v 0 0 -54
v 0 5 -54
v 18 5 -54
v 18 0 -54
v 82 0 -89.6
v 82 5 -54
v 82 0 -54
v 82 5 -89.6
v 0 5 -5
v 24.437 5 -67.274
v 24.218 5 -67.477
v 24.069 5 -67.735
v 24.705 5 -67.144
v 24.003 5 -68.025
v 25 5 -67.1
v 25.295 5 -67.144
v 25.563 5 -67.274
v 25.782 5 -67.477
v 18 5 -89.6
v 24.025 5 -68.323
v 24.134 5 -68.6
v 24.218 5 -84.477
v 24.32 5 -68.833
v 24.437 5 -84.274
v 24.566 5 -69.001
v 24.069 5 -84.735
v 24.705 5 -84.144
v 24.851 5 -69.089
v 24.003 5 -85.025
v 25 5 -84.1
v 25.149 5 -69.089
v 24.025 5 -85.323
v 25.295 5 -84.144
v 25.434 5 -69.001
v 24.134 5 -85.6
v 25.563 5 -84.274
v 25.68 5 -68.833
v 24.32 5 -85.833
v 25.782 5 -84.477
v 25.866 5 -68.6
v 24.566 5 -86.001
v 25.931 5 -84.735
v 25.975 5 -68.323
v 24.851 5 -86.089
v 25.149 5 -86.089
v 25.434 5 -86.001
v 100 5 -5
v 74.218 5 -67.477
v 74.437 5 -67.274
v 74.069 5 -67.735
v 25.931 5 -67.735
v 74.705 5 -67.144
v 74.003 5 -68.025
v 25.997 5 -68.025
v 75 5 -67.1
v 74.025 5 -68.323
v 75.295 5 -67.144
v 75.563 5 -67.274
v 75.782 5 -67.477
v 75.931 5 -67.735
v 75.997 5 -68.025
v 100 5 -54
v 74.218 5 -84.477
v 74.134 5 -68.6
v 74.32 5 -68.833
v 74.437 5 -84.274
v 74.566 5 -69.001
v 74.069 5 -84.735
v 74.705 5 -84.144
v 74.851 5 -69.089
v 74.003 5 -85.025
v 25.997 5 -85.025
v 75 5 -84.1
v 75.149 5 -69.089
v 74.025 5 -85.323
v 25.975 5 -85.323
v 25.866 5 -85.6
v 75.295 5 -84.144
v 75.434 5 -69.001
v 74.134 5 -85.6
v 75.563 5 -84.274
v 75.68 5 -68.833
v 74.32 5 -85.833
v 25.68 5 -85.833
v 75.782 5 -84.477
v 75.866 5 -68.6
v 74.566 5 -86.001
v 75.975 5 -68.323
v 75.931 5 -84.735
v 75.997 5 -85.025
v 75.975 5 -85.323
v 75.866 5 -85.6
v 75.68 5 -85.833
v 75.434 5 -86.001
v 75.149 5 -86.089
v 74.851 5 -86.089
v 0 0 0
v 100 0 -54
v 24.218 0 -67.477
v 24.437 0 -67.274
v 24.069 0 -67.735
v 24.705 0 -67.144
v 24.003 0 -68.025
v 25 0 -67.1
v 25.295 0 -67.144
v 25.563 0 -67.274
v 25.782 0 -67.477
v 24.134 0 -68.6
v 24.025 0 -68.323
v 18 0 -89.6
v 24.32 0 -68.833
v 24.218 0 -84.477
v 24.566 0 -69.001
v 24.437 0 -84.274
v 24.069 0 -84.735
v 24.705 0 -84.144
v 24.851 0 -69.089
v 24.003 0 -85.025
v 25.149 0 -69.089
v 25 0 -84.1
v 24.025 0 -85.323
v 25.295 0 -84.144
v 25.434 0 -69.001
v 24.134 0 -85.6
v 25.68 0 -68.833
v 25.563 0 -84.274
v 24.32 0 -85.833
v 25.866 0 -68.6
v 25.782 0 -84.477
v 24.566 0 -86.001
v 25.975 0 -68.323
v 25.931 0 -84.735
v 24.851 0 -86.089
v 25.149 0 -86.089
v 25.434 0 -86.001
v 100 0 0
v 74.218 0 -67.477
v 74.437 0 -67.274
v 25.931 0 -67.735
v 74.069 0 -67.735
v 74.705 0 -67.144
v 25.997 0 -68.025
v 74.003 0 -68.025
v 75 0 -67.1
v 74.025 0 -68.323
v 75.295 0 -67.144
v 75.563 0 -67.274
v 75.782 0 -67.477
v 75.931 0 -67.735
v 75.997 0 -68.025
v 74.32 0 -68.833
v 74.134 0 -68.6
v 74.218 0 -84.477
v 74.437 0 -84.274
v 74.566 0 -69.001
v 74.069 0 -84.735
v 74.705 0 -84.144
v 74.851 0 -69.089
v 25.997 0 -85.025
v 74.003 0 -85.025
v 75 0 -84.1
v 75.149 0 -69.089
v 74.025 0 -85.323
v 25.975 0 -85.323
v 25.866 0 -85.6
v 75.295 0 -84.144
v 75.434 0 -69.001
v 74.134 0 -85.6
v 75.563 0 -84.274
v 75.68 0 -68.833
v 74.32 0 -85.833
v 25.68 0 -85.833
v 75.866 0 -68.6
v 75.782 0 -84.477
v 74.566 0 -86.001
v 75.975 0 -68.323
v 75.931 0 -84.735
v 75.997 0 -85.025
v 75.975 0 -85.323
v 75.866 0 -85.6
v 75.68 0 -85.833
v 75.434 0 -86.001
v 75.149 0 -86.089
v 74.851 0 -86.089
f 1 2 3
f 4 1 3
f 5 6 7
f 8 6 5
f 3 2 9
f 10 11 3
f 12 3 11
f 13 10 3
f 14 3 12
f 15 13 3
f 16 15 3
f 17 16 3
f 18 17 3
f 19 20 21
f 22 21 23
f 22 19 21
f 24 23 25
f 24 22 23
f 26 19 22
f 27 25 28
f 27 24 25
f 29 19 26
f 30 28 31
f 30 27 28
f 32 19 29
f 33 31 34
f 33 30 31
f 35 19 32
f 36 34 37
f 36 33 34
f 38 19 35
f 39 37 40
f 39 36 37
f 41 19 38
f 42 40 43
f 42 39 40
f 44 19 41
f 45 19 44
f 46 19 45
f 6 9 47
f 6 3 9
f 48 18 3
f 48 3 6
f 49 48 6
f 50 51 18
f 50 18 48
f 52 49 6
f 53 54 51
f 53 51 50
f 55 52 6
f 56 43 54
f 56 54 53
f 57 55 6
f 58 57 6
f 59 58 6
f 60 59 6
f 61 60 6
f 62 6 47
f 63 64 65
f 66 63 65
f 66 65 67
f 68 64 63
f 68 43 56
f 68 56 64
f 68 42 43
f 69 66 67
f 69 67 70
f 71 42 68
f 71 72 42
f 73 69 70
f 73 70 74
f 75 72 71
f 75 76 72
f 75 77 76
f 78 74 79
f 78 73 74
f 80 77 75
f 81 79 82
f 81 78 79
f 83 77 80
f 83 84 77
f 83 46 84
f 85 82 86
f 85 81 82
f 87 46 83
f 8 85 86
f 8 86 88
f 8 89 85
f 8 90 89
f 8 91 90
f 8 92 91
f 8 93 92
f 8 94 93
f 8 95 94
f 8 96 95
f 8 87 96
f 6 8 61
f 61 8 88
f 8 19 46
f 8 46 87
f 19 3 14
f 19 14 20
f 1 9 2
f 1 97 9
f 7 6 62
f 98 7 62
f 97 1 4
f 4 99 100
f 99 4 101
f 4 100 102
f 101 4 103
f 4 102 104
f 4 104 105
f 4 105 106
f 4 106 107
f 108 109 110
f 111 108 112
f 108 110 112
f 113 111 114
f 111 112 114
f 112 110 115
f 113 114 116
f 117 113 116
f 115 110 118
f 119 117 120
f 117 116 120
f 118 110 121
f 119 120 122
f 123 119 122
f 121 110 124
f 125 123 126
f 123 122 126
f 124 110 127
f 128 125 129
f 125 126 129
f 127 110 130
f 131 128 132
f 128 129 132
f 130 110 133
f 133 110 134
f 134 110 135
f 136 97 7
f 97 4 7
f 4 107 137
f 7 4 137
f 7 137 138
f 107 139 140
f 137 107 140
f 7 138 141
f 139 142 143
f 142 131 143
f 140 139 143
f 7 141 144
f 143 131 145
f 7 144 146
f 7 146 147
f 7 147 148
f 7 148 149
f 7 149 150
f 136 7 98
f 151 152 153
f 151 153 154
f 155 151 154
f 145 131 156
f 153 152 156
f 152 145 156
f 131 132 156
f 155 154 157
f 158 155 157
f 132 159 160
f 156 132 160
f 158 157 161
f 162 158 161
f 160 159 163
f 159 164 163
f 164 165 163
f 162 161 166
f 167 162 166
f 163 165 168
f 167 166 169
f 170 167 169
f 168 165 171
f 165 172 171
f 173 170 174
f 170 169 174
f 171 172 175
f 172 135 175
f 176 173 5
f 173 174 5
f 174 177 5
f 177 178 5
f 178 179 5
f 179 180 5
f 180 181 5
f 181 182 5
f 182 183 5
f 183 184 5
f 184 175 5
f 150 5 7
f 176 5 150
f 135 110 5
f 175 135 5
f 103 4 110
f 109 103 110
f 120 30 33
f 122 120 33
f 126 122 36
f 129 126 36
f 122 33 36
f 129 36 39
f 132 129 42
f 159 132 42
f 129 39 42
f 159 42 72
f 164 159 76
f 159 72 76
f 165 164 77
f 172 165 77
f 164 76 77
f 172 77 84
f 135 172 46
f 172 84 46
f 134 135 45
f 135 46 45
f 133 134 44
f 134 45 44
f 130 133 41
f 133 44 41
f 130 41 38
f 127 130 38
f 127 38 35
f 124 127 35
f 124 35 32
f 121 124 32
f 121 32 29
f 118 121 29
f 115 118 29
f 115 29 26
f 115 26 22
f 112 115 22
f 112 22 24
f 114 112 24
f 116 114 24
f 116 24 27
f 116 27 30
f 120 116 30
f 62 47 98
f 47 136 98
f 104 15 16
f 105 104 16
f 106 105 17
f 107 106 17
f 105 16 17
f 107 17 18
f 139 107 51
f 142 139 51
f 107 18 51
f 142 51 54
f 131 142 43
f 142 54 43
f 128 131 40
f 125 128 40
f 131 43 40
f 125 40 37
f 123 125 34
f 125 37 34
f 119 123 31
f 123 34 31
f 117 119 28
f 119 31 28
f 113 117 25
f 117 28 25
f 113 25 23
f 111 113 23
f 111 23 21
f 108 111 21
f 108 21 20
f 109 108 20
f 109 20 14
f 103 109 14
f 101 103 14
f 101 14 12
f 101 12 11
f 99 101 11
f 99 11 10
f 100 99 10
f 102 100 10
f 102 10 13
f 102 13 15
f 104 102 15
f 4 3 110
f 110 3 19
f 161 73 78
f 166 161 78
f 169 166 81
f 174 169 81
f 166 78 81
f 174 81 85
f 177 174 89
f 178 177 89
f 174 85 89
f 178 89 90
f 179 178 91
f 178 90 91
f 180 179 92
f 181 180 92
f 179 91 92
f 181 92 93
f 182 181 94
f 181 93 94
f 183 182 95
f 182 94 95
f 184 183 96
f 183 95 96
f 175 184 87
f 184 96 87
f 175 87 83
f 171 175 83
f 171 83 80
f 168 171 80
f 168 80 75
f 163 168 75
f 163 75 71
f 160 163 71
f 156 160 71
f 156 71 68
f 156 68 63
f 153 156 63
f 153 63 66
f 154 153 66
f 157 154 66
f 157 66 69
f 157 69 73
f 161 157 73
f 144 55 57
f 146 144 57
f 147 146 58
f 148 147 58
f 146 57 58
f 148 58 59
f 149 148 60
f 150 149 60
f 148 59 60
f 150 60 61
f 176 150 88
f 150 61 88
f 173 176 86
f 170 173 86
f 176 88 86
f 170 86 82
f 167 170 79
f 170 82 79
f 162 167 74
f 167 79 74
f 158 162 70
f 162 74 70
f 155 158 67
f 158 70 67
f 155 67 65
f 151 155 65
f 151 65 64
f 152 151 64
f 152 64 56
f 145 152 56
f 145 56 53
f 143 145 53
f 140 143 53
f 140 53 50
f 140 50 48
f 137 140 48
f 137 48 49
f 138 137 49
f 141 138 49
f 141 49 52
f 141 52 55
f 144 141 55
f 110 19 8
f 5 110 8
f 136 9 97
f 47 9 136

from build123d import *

# Parameters (mm, degrees)
CROQUIS2_W              = 100
CROQUIS2_H              = 99.2
SALIENTE_EXTRUIR1_DEPTH = 5
CHAFL_N1_SIZE           = 5
CROQUIS3_W              = 18
CROQUIS3_H              = 45.2
CORTAR_EXTRUIR1_DEPTH   = 5
CROQUIS6_R              = 1
CORTAR_EXTRUIR3_DEPTH   = 10
CROQUIS8_W              = 64
CROQUIS8_H              = 9.6
CORTAR_EXTRUIR4_DEPTH   = 141.94552139


with BuildPart() as part:
    # Croquis2 → Saliente-Extruir1 (new body)
    with BuildSketch(Plane(origin=(0, 0, 0), x_dir=(1, 0, 0), z_dir=(0, 1, 0))):
        with Locations((50, 49.6)):
            Rectangle(CROQUIS2_W, CROQUIS2_H)
    extrude(amount=SALIENTE_EXTRUIR1_DEPTH)

    # Chaflán1
    chafl_n1_edges = [part.edges().sort_by_distance(p)[0] for p in [
        (50, 5, 0),
    ]]
    chamfer(chafl_n1_edges, length=CHAFL_N1_SIZE - 0.0001)  # a hair under: the kernel refuses the full size

    # Croquis3 → Cortar-Extruir1 (cut)
    with BuildSketch(Plane(origin=(0, 5, 0), x_dir=(1, 0, 0), z_dir=(0, 1, 0))):
        with Locations((9, 76.6)):
            Rectangle(CROQUIS3_W, CROQUIS3_H)
        with Locations((91, 76.6)):
            Rectangle(CROQUIS3_W, CROQUIS3_H)
    extrude(amount=-CORTAR_EXTRUIR1_DEPTH, mode=Mode.SUBTRACT)

    # Croquis6 → Cortar-Extruir3 (cut)
    with BuildSketch(Plane(origin=(0, 5, 0), x_dir=(1, 0, 0), z_dir=(0, 1, 0))):
        with Locations(Location((25, 85.1, 0), (0, 0, 270))):
            Circle(CROQUIS6_R)
        with Locations(Location((25, 68.1, 0), (0, 0, 270))):
            Circle(CROQUIS6_R)
        with Locations(Location((75, 85.1, 0), (0, 0, 270))):
            Circle(CROQUIS6_R)
        with Locations(Location((75, 68.1, 0), (0, 0, 270))):
            Circle(CROQUIS6_R)
    extrude(amount=-CORTAR_EXTRUIR3_DEPTH, mode=Mode.SUBTRACT)

    # Croquis8 → Cortar-Extruir4 (cut, through all)
    with BuildSketch(Plane(origin=(0, 5, 0), x_dir=(1, 0, 0), z_dir=(0, 1, 0))):
        with Locations((50, 94.4)):
            Rectangle(CROQUIS8_W, CROQUIS8_H)
    extrude(amount=-CORTAR_EXTRUIR4_DEPTH, mode=Mode.SUBTRACT)


solid = part.part
